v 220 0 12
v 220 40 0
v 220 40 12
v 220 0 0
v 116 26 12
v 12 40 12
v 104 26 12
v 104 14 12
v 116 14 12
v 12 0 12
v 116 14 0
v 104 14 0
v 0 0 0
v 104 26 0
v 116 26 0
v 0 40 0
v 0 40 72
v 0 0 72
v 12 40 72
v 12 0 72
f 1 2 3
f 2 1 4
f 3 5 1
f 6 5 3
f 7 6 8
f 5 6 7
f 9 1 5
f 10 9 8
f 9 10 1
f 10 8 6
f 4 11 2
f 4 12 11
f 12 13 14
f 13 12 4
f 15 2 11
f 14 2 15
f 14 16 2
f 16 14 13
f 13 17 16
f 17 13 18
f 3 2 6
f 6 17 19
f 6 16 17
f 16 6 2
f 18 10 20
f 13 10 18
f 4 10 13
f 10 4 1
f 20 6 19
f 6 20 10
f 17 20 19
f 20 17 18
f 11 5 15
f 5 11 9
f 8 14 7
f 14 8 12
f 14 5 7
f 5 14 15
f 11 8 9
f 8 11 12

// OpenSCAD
$fn = 32;

// ----------------------------------------------------------------------
// Gantry bracket: 200-250 mm L bracket
// ----------------------------------------------------------------------

// --- parameters (mm) ---
base_l = 220;             // base arm length, X
arm_w = 40;               // arm width, Y
thick = 12;               // arm thickness
up_h = 60;                // vertical arm height, Z
slot_w = 12;              // adjustment slot width in the base

total_h = up_h + thick;  // overall height

difference() {
  union() {
    cube([base_l, arm_w, thick]);
    cube([thick, arm_w, total_h]);
  }
  translate([base_l / 2 - slot_w / 2, arm_w / 2 - slot_w / 2, -1])
    cube([slot_w, slot_w, thick + 2]);
}
